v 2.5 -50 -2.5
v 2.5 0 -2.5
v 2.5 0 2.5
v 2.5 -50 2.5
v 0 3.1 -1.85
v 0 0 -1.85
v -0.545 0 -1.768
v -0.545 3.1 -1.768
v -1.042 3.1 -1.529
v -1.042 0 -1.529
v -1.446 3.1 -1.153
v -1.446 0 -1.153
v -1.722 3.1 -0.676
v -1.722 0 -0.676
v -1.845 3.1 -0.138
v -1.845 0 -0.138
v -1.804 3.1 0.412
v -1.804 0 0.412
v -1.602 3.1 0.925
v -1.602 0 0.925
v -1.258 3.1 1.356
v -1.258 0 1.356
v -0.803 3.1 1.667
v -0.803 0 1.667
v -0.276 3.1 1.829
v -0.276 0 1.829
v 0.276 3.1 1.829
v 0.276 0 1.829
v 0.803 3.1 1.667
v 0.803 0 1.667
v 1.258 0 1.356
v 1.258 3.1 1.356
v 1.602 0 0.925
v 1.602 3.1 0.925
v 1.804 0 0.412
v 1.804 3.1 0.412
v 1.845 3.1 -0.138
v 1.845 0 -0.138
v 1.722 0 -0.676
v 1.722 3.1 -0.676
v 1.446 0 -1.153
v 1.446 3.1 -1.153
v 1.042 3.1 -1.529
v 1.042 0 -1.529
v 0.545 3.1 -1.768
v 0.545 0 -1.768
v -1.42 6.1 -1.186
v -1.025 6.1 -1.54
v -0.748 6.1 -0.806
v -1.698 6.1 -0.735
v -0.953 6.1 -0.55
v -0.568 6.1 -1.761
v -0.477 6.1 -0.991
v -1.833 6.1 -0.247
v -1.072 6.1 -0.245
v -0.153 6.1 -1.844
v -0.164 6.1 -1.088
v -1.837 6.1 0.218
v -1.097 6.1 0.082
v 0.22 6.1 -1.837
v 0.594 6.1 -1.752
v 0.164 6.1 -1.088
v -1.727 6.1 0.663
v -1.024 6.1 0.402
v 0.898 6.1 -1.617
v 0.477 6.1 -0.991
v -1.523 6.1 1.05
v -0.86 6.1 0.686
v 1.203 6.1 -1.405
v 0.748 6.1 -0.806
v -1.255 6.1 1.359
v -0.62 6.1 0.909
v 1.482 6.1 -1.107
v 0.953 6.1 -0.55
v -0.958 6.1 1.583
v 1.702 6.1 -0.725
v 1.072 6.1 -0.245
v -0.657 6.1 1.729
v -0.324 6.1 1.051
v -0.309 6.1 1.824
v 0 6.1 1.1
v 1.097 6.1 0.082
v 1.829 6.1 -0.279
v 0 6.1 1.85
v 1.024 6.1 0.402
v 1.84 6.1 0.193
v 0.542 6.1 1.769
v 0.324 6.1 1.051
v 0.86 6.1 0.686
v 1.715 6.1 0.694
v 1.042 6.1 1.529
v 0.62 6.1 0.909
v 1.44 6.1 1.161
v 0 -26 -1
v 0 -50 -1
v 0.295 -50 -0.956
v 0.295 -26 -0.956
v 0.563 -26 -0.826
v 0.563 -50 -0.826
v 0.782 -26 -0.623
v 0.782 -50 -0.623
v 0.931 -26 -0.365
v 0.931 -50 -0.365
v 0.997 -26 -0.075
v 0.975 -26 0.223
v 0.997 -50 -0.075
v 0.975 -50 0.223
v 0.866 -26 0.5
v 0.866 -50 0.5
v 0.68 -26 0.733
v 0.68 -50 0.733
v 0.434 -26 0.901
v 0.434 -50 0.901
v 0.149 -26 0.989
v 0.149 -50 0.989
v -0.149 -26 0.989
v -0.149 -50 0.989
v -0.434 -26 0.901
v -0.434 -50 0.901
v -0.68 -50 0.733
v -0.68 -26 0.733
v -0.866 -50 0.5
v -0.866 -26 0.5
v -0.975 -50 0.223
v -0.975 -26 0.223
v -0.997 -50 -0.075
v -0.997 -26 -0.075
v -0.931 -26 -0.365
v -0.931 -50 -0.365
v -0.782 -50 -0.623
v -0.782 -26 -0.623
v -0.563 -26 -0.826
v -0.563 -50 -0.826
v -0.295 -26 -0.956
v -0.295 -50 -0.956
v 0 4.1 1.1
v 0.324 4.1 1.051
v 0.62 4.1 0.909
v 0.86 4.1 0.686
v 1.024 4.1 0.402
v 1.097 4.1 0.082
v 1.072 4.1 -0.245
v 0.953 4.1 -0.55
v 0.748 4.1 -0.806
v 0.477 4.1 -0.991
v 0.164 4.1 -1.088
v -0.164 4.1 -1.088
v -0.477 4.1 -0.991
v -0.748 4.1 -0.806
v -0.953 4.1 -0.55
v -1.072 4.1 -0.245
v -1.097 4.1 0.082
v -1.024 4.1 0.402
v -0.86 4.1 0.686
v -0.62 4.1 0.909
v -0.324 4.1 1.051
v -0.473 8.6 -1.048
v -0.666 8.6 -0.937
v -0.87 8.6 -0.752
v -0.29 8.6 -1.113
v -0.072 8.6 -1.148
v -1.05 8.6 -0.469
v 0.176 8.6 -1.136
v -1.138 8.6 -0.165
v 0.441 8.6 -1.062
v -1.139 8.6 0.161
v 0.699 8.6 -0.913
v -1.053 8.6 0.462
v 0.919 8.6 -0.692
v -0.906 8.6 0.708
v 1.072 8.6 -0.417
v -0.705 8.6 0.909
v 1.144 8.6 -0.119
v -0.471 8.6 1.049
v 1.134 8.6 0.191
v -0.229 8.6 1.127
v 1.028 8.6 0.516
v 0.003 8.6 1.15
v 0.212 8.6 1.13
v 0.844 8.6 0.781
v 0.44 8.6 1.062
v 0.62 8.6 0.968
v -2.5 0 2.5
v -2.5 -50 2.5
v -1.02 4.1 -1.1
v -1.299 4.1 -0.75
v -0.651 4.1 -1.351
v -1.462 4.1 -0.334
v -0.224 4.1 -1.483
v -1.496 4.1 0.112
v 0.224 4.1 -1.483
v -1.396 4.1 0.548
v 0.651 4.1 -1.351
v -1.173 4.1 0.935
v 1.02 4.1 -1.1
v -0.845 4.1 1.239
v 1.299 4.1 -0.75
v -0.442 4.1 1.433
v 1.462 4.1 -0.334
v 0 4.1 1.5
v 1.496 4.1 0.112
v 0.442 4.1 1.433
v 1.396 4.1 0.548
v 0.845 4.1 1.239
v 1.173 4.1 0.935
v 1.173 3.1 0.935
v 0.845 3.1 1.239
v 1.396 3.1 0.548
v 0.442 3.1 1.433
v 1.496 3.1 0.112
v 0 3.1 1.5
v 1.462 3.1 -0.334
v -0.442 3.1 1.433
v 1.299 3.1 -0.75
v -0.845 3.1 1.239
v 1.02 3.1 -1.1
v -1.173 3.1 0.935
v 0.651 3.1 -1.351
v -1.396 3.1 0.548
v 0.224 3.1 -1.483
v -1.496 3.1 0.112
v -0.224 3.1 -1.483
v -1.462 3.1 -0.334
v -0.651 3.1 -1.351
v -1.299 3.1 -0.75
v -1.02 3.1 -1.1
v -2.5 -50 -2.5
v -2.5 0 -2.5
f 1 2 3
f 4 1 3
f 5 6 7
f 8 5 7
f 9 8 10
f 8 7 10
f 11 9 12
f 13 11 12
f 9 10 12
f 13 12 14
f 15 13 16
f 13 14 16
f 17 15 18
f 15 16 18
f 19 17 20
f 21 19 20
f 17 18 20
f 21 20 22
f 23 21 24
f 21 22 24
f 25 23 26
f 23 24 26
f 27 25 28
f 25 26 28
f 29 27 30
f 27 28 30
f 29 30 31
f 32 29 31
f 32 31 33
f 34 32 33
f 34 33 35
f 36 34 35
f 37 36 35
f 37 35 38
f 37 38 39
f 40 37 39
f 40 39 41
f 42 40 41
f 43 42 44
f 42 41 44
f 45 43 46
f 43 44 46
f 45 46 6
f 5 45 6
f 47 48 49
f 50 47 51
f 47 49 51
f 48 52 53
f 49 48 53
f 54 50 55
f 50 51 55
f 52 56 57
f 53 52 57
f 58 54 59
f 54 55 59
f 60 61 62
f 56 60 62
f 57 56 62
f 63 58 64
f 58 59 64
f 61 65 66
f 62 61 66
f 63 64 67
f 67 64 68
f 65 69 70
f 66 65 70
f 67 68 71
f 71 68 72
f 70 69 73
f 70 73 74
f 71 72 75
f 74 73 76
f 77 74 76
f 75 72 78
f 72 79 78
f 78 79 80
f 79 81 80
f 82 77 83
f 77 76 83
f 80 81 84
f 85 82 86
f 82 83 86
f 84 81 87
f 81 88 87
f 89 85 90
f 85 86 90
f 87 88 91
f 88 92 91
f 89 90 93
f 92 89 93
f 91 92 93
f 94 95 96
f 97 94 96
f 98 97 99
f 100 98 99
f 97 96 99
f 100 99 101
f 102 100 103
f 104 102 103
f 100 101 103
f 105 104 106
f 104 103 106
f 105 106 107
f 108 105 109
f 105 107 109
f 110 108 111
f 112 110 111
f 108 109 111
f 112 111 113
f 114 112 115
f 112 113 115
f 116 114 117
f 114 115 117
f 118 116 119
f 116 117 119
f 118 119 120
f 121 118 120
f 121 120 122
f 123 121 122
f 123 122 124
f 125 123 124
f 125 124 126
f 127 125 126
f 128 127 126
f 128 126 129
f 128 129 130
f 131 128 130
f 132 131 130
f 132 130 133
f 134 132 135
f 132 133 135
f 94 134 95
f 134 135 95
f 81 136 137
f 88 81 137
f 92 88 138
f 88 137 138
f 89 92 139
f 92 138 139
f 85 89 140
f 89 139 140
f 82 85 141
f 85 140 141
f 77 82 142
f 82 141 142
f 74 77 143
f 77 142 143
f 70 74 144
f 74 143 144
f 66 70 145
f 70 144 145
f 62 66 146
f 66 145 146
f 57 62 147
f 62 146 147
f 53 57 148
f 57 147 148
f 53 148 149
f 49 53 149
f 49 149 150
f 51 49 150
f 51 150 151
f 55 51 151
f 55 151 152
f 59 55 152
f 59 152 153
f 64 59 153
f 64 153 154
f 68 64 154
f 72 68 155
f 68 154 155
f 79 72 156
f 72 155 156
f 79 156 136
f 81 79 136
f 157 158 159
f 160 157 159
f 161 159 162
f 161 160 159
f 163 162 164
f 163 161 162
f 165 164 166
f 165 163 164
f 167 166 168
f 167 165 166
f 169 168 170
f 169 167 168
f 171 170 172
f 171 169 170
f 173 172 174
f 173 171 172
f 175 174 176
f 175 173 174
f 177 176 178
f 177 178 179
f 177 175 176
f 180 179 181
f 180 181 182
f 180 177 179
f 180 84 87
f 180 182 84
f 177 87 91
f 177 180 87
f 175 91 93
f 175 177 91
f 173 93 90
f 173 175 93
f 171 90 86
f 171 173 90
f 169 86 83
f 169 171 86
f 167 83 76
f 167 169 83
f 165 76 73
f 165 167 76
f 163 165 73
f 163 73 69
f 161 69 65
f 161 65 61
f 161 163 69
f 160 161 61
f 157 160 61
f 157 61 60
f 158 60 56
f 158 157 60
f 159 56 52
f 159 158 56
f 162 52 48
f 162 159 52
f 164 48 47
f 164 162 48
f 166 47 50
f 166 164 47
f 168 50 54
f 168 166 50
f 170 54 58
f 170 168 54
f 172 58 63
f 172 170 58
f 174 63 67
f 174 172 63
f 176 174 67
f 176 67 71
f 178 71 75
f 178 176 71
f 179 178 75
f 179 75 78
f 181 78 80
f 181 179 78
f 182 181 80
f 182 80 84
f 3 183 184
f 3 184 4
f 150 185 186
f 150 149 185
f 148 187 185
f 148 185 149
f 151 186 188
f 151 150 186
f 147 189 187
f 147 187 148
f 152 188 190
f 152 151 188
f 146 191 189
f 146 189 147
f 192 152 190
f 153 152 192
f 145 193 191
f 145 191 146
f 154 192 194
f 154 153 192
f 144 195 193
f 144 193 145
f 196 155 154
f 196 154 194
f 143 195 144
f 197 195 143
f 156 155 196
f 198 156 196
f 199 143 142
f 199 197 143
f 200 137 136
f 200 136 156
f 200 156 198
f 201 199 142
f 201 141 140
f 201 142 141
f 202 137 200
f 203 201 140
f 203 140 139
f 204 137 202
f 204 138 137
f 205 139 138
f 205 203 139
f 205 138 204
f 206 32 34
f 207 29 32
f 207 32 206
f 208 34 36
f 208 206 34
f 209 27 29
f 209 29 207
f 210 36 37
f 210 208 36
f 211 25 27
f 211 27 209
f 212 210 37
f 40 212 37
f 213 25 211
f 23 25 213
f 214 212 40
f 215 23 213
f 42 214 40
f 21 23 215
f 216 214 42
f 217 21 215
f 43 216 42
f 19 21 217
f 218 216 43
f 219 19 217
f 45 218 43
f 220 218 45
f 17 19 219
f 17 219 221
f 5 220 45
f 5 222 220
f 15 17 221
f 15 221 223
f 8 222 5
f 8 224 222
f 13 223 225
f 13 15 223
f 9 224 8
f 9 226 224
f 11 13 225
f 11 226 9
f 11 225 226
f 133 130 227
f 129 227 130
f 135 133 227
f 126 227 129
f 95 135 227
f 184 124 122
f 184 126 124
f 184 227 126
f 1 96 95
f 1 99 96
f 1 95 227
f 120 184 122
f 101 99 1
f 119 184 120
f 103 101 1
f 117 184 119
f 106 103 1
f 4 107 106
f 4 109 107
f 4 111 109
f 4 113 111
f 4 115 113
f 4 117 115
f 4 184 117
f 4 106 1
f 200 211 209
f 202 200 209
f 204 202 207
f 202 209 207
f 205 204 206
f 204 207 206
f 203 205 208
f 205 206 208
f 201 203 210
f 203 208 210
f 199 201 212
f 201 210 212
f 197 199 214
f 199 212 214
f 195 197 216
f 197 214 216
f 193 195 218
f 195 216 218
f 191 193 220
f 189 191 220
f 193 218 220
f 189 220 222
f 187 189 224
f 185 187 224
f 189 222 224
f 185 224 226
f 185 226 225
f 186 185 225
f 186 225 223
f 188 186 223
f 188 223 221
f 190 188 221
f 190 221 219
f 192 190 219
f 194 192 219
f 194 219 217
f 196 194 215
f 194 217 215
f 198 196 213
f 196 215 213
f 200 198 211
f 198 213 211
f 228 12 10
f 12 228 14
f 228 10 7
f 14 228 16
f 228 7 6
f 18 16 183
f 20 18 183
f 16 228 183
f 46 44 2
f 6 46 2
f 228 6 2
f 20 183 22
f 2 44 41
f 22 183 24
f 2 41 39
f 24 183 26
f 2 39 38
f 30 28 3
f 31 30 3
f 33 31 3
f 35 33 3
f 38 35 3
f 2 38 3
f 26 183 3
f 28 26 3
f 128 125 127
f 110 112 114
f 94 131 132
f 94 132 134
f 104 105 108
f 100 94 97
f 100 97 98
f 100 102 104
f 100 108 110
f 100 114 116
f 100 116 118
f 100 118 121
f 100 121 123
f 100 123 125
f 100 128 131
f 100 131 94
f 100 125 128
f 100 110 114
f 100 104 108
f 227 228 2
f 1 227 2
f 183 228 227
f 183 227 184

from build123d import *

# Parameters (mm, degrees)
SKETCH1_R           = 1.85
BOSS_EXTRUDE1_DEPTH = 3.1
SKETCH2_R           = 1.5
BOSS_EXTRUDE2_DEPTH = 1
SKETCH3_R           = 1.1
BOSS_EXTRUDE3_DEPTH = 2
SKETCH6_W           = 5
SKETCH6_H           = 5
BOSS_EXTRUDE4_DEPTH = 50
SKETCH7_R           = 1
CUT_EXTRUDE1_DEPTH  = 24


with BuildPart() as part:
    # Sketch1 → Boss-Extrude1 (new body)
    with BuildSketch(Plane(origin=(0, 0, 0), x_dir=(1, 0, 0), z_dir=(0, 1, 0))):
        with Locations(Location((0, 0, 0), (0, 0, 90))):
            Circle(SKETCH1_R)
    extrude(amount=BOSS_EXTRUDE1_DEPTH)

    # Sketch2 → Boss-Extrude2 (add)
    with BuildSketch(Plane(origin=(0, 3.1, 0), x_dir=(1, 0, 0), z_dir=(0, 1, 0))):
        with Locations(Location((0, 0, 0), (0, 0, 270))):
            Circle(SKETCH2_R)
    extrude(amount=BOSS_EXTRUDE2_DEPTH)

    # Sketch3 → Boss-Extrude3 (add)
    with BuildSketch(Plane(origin=(0, 4.1, 0), x_dir=(1, 0, 0), z_dir=(0, 1, 0))):
        with Locations(Location((0, 0, 0), (0, 0, 270))):
            Circle(SKETCH3_R)
    extrude(amount=BOSS_EXTRUDE3_DEPTH)

    # Loft1: read off the stored shape, not the designer's step
    # Loft1: loft between two sections, ruled curve by curve
    loft1_from = [
        Edge.make_bspline([(0, 6.1, 1.85), (3.7, 6.1, 1.85), (3.7, 6.1, -1.85), (0, 6.1, -1.85), (-3.7, 6.1, -1.85), (-3.7, 6.1, 1.85), (0, 6.1, 1.85)], [0, 0, 0, 0, 0.5, 0.5, 0.5, 1, 1, 1, 1], 3, [1, 0.333333333, 0.333333333, 1, 0.333333333, 0.333333333, 1]),
    ]
    loft1_to = [
        Edge.make_bspline([(0.620465421, 8.6, 0.968257539), (2.556980499, 8.6, -0.272673303), (1.316049657, 8.6, -2.209188381), (-0.620465421, 8.6, -0.968257539), (-2.556980499, 8.6, 0.272673303), (-1.316049657, 8.6, 2.209188381), (0.620465421, 8.6, 0.968257539)], [0, 0, 0, 0, 0.5, 0.5, 0.5, 1, 1, 1, 1], 3, [1, 0.333333333, 0.333333333, 1, 0.333333333, 0.333333333, 1]),
    ]
    loft1 = Solid(Shell([*[Face.make_surface_from_curves(loft1_from[k], loft1_to[k]) for k in range(1)], Face(Wire(loft1_from)), Face(Wire(loft1_to))]))
    add(loft1)

    # Sketch6 → Boss-Extrude4 (add)
    with BuildSketch(Plane.XZ):
        Rectangle(SKETCH6_W, SKETCH6_H)
    extrude(amount=BOSS_EXTRUDE4_DEPTH)

    # Sketch7 → Cut-Extrude1 (cut)
    with BuildSketch(Plane.XZ.offset(50)):
        with Locations(Location((0, 0, 0), (0, 0, 270))):
            Circle(SKETCH7_R)
    extrude(amount=-CUT_EXTRUDE1_DEPTH, mode=Mode.SUBTRACT)


solid = part.part
